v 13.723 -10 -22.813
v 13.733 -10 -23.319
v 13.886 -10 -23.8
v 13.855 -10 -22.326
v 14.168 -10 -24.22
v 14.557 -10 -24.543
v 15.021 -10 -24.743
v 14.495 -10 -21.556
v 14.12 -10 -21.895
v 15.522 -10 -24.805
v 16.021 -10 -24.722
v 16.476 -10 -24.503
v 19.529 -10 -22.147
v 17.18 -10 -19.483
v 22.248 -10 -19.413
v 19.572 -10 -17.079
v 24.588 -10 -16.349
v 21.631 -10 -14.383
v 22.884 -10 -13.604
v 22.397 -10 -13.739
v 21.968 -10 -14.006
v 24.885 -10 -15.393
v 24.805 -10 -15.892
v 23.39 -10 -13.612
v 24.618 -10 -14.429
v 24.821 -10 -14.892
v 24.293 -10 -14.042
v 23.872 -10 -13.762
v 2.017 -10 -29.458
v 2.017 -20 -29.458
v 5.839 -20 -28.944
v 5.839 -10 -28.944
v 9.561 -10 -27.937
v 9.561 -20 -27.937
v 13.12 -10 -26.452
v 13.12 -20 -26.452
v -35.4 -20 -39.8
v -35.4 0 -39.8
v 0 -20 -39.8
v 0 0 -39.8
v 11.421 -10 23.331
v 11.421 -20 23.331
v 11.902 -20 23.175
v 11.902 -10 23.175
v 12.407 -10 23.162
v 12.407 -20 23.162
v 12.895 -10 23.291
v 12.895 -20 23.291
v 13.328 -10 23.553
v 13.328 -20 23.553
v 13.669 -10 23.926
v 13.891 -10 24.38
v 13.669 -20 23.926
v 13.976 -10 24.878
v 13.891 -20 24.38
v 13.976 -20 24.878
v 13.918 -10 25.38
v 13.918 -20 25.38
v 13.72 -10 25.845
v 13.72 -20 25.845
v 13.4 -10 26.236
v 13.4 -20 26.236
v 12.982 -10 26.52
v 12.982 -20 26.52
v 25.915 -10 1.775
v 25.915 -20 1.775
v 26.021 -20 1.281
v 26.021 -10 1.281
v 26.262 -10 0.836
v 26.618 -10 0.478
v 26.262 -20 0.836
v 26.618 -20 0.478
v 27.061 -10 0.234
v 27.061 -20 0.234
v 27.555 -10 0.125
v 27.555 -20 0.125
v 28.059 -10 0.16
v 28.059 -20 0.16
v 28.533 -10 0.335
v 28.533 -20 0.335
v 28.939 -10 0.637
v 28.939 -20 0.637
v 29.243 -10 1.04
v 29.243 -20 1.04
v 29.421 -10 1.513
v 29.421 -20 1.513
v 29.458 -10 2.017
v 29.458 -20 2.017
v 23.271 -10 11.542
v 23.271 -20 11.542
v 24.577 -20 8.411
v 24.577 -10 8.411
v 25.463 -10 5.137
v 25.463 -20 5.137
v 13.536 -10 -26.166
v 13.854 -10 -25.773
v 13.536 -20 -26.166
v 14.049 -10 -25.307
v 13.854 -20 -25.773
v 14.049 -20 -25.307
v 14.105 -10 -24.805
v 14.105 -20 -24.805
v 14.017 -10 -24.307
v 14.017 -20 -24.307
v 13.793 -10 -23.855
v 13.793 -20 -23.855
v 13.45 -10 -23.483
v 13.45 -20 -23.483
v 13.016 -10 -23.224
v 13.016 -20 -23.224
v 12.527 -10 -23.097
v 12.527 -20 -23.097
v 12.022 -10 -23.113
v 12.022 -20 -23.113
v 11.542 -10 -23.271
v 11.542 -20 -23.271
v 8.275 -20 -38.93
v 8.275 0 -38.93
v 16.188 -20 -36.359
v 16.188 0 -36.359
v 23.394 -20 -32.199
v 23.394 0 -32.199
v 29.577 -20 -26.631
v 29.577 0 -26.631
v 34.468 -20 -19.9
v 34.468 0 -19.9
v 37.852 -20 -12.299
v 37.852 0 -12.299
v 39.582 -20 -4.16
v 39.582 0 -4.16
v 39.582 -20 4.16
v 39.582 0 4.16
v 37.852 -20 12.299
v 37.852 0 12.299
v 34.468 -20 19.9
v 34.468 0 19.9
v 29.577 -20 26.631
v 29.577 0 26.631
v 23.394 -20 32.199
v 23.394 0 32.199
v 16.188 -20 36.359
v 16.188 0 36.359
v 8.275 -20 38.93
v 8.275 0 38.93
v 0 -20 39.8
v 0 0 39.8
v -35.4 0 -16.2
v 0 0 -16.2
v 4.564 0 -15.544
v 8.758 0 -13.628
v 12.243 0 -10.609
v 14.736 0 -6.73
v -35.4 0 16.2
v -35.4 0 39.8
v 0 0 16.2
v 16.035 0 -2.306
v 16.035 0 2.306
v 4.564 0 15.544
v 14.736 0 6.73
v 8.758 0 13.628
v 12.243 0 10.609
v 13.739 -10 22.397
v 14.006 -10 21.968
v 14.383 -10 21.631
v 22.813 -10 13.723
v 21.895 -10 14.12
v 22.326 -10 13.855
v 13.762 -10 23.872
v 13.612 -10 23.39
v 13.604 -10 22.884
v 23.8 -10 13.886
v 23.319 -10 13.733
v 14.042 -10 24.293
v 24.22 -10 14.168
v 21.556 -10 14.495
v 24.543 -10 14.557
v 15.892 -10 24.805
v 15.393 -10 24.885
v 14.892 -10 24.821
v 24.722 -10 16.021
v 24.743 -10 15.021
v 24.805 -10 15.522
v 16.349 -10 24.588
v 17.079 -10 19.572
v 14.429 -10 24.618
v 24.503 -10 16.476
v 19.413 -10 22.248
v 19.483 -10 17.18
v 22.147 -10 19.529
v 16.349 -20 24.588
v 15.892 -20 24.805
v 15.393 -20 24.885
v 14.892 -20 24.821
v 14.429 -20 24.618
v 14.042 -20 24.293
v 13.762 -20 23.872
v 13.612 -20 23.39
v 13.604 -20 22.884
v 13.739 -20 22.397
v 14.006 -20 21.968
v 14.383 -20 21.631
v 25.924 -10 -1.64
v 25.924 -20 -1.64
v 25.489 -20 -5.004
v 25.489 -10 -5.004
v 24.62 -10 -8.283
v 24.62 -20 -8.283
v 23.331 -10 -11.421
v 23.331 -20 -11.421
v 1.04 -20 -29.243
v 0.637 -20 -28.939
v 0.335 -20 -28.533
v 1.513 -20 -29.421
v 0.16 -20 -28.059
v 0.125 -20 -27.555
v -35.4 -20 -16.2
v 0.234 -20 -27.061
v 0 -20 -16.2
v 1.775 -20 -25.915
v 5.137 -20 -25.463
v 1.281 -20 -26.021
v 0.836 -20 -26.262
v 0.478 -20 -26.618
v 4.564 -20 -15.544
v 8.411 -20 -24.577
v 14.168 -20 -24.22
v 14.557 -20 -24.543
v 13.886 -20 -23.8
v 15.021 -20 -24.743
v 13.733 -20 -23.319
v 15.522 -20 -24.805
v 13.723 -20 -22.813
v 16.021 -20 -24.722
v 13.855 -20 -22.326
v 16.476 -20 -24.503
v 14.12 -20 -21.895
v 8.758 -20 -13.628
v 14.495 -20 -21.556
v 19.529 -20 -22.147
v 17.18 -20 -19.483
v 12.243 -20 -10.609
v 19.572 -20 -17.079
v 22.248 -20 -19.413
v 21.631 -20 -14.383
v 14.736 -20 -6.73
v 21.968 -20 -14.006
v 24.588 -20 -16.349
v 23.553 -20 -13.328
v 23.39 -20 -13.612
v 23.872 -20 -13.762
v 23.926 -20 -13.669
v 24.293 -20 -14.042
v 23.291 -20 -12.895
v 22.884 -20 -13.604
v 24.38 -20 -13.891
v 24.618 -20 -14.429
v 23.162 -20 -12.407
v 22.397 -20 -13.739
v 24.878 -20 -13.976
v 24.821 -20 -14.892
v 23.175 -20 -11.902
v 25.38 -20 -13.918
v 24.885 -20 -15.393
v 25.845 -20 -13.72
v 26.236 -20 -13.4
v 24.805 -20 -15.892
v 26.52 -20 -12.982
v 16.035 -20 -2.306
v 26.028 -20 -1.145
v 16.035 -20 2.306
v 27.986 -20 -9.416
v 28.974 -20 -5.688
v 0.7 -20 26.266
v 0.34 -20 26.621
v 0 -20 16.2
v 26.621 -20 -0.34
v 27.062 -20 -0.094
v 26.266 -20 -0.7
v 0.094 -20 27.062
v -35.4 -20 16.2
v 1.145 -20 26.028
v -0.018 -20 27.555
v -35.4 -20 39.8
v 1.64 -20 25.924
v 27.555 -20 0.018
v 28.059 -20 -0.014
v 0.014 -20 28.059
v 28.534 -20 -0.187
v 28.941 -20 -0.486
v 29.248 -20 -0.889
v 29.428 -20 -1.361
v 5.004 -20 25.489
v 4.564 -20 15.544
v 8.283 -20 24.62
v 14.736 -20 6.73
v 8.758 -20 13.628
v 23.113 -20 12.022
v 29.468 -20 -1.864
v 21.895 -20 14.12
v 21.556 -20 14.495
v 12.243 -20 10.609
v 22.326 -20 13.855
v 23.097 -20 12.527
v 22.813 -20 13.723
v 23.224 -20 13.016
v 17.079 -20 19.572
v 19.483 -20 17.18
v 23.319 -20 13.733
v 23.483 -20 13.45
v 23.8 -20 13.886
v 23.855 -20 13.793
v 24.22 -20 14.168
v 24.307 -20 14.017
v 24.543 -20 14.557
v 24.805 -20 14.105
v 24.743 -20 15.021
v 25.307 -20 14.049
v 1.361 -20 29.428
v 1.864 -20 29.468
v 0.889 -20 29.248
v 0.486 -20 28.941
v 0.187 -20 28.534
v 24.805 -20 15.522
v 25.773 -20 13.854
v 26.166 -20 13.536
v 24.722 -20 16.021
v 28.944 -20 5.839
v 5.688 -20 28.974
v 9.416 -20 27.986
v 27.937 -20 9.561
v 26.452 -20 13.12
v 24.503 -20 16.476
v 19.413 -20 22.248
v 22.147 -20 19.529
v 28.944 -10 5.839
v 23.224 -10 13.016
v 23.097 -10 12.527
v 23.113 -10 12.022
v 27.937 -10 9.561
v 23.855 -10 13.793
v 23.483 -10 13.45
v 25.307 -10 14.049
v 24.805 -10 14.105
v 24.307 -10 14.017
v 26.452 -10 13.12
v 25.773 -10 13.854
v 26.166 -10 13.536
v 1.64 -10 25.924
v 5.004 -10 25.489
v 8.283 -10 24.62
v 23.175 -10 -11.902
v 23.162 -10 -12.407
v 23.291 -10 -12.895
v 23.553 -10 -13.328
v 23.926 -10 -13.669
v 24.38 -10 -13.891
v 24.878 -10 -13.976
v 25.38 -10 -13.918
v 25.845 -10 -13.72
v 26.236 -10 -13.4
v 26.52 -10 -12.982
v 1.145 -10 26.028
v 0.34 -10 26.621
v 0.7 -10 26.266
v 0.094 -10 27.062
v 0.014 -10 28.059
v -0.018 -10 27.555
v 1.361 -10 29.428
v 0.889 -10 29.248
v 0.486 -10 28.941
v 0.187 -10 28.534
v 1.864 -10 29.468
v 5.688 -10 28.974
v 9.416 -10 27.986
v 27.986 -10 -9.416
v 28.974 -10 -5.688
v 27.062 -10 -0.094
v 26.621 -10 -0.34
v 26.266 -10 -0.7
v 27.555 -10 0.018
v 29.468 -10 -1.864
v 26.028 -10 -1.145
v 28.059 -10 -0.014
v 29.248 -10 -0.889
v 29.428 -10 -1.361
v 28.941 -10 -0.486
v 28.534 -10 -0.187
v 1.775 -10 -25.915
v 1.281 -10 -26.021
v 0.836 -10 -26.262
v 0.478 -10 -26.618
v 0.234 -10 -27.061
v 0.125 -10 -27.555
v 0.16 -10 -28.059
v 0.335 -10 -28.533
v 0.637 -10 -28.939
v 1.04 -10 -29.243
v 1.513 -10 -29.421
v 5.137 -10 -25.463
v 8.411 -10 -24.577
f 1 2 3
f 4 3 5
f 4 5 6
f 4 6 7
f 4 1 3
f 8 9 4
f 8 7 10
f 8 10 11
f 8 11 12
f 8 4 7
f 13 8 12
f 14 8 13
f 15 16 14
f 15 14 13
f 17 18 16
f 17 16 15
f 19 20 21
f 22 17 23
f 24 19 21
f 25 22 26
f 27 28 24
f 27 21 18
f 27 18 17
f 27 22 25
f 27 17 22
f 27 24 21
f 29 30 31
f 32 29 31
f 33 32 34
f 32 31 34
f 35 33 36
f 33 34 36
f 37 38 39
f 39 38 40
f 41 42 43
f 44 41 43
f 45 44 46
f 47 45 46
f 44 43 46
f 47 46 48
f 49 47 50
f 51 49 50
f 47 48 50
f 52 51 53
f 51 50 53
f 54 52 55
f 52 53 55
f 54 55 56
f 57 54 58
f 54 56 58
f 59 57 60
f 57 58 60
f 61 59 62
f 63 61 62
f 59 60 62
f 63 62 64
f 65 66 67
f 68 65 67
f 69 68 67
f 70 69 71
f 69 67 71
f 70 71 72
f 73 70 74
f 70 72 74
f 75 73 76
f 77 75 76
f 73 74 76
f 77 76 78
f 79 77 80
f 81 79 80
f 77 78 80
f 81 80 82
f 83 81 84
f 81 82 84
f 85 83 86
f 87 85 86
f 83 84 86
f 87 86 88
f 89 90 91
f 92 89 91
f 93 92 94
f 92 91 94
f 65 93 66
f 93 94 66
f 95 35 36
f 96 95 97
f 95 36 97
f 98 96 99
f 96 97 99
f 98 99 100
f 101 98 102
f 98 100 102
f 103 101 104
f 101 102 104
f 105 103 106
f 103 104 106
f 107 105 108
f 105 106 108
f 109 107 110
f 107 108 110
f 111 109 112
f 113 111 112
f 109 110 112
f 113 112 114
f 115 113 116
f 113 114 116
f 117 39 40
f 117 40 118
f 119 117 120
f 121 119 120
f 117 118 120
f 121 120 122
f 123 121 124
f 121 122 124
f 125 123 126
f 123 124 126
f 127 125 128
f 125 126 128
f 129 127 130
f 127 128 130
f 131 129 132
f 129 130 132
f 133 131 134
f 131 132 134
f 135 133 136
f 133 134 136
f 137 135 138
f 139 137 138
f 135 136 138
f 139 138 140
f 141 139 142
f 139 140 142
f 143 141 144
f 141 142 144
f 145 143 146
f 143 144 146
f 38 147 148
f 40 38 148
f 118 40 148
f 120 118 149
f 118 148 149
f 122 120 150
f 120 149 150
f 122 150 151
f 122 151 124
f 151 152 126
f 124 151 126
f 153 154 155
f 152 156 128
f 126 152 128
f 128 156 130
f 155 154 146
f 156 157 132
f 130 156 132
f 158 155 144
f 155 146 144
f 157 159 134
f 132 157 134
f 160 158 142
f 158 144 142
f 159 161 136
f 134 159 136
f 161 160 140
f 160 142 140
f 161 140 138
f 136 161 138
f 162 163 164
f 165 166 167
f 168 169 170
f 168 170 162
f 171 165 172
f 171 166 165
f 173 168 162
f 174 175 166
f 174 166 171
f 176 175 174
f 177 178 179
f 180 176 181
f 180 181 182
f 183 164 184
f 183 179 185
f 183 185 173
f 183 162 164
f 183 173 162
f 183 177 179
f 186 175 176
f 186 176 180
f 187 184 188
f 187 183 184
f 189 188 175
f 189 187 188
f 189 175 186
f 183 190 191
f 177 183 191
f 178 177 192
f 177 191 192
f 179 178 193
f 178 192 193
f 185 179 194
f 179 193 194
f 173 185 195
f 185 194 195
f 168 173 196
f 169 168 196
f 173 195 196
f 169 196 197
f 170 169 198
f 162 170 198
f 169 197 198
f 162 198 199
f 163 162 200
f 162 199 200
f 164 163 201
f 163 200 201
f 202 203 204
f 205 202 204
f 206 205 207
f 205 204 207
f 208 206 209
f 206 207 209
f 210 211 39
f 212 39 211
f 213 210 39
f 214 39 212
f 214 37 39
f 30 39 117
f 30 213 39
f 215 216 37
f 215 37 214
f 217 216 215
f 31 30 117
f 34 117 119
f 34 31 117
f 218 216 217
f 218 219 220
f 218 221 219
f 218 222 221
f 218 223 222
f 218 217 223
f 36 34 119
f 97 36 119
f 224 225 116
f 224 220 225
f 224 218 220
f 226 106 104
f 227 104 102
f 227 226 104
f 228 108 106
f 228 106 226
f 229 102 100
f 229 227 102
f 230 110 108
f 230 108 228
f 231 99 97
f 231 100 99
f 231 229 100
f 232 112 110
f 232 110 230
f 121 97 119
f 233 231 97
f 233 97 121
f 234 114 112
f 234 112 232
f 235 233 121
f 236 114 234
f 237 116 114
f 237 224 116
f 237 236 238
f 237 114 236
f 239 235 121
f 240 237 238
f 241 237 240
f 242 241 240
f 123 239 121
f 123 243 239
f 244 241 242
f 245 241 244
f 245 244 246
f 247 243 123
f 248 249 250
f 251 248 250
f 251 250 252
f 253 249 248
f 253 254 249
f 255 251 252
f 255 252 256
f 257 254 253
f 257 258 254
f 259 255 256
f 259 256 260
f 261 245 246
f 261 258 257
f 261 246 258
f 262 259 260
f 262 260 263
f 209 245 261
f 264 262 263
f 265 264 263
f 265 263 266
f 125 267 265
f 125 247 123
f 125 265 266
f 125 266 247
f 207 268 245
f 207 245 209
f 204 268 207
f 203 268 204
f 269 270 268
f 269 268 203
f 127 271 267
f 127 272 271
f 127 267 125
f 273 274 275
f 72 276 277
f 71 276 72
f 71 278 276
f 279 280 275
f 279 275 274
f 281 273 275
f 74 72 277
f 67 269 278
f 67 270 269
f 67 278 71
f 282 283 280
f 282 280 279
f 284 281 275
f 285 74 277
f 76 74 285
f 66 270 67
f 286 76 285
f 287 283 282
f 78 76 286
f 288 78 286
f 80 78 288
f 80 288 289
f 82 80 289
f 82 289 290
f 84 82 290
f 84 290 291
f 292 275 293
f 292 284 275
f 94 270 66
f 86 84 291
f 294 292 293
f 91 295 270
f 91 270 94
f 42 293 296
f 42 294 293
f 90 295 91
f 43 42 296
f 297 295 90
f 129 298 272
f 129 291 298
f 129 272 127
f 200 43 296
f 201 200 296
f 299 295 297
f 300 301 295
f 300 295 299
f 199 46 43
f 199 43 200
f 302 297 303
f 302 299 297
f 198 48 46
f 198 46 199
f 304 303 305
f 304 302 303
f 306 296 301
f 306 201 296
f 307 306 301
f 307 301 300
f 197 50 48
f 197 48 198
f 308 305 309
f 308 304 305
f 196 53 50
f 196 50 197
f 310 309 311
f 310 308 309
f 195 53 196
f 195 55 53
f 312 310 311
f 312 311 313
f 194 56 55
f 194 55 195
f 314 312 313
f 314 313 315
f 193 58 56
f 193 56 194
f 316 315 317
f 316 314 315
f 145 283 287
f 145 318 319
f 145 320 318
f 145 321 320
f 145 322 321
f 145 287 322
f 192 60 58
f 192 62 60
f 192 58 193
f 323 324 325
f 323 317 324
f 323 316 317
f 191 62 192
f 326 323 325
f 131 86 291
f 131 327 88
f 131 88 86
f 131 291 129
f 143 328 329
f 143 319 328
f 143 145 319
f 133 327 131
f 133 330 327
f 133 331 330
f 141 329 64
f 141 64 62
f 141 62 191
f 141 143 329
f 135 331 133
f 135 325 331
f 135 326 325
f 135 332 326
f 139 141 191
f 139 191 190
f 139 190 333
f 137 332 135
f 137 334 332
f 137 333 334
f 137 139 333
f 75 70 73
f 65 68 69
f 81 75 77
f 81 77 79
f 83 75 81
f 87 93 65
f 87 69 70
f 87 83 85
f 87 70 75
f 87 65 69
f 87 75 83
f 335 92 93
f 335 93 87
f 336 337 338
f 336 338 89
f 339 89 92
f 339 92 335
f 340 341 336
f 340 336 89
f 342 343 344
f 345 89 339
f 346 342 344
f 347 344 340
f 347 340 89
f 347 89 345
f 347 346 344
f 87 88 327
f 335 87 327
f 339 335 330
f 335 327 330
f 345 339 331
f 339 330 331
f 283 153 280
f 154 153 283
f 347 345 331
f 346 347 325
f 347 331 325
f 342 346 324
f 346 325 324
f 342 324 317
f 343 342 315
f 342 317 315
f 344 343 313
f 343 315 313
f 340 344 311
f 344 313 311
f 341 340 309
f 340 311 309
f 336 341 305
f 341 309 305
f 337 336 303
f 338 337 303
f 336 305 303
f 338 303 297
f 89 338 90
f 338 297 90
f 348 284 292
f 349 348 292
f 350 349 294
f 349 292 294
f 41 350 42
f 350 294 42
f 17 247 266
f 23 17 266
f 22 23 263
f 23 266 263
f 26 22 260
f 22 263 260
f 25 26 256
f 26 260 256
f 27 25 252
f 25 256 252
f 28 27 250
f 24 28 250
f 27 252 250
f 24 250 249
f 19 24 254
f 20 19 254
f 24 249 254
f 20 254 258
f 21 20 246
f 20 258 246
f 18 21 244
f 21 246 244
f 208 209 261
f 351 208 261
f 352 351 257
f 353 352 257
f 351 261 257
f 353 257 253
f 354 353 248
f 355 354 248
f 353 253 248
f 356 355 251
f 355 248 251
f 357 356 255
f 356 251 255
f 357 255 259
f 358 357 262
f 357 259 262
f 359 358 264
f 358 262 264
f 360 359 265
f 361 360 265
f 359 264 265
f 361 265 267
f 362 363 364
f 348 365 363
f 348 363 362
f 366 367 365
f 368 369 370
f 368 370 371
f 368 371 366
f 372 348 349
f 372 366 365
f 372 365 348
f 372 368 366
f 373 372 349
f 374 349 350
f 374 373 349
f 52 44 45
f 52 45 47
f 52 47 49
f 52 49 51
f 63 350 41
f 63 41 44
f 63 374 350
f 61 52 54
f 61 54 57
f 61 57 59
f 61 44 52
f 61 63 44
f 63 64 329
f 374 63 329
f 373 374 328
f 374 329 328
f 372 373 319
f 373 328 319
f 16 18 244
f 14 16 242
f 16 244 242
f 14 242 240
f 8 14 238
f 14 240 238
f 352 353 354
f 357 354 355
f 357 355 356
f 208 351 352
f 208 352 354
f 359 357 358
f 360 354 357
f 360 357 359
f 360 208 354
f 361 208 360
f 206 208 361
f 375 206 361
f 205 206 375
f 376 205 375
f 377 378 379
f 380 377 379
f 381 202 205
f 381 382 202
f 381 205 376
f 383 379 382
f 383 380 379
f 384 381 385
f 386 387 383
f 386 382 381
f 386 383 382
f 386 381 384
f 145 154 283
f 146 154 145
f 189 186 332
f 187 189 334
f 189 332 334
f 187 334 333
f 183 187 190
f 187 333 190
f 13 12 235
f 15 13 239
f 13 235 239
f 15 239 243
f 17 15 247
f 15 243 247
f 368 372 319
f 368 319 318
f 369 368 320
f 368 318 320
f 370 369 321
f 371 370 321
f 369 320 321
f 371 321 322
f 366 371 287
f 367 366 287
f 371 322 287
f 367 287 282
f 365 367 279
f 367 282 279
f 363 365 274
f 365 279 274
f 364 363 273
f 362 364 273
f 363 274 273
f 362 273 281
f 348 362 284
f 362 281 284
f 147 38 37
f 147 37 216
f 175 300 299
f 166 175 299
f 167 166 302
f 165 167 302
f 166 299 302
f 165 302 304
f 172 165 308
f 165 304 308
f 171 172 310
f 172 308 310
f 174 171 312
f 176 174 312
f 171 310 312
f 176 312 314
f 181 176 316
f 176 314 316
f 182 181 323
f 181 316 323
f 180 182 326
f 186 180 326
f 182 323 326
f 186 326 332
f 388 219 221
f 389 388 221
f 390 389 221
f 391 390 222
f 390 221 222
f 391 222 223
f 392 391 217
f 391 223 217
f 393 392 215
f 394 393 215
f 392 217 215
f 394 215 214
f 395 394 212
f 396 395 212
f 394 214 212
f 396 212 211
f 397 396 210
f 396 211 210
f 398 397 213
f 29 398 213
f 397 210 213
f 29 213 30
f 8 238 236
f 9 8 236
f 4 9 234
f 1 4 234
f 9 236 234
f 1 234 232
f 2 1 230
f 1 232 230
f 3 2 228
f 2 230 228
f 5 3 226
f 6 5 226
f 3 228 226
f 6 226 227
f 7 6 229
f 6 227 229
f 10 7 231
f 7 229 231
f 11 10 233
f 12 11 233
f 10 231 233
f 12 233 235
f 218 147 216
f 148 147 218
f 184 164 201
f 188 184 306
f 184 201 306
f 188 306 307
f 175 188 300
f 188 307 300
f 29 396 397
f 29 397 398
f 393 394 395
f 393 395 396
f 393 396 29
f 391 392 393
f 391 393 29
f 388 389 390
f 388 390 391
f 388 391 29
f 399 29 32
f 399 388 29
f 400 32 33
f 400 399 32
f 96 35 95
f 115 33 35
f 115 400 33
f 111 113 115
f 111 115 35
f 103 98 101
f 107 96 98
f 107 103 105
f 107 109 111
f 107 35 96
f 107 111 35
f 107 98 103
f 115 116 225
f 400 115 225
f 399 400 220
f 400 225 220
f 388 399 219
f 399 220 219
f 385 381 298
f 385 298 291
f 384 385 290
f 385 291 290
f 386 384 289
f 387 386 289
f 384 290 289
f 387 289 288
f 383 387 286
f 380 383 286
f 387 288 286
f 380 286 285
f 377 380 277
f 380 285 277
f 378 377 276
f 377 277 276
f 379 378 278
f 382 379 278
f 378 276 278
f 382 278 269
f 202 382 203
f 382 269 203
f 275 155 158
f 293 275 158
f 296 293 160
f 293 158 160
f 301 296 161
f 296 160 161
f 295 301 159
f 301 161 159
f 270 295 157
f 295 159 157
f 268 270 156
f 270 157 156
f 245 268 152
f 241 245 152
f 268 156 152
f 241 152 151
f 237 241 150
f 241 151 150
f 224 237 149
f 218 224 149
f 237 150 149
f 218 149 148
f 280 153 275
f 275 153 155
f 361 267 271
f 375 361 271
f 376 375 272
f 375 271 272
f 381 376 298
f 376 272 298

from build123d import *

# Parameters (mm, degrees)
F0_W     = 35.4
F0_H     = 23.6
F1_DEPTH = 20
F3_DEPTH = 10


with BuildPart() as f1:
    # F0 (on Front) → F1 (new body)
    with BuildSketch(Plane.XZ):
        with Locations((-17.7, 28)):
            Rectangle(F0_W, F0_H)
        with BuildLine():
            ThreePointArc((0, -39.8), (39.8, 0), (0, 39.8))
            Line((0, 39.8), (0, 16.2))
            ThreePointArc((0, 16.2), (16.2, 0), (0, -16.2))
            Line((0, -16.2), (0, -39.8))
        make_face()
        with Locations((-17.7, -28)):
            Rectangle(F0_W, F0_H)
    extrude(amount=F1_DEPTH)

    # F2 (on face) → F3 (cut)
    with BuildSketch(Plane.XZ.offset(20)):
        with BuildLine():
            ThreePointArc((12.98208, 26.520214), (7.568156, 28.540833), (1.864359, 29.468293))
            ThreePointArc((1.864359, 29.468293), (-0.019794, 27.808362), (1.640137, 25.924209))
            ThreePointArc((1.640137, 25.924209), (6.657951, 25.108293), (11.420755, 23.330688))
            ThreePointArc((11.420755, 23.330688), (13.79618, 24.144789), (12.98208, 26.520214))
        make_face()
        with BuildLine():
            ThreePointArc((14.382505, 21.630955), (18.320101, 18.415444), (21.556008, 14.494592))
            ThreePointArc((21.556008, 14.494592), (24.020237, 14.01191), (24.502918, 16.476139))
            ThreePointArc((24.502918, 16.476139), (20.824632, 20.933009), (16.348729, 24.588111))
            ThreePointArc((16.348729, 24.588111), (13.887039, 24.092645), (14.382505, 21.630955))
        make_face()
        with BuildLine():
            ThreePointArc((23.271092, 11.541705), (25.073395, 6.788192), (25.915346, 1.77468))
            ThreePointArc((25.915346, 1.77468), (27.80809, 0.124552), (29.458219, 2.017296))
            ThreePointArc((29.458219, 2.017296), (28.501164, 7.716202), (26.45247, 13.119565))
            ThreePointArc((26.45247, 13.119565), (24.072851, 13.921324), (23.271092, 11.541705))
        make_face()
        with BuildLine():
            ThreePointArc((25.924209, -1.640137), (25.108293, -6.657951), (23.330688, -11.420755))
            ThreePointArc((23.330688, -11.420755), (24.144789, -13.79618), (26.520214, -12.98208))
            ThreePointArc((26.520214, -12.98208), (28.540833, -7.568156), (29.468293, -1.864359))
            ThreePointArc((29.468293, -1.864359), (27.808362, 0.019794), (25.924209, -1.640137))
        make_face()
        with BuildLine():
            ThreePointArc((21.630955, -14.382505), (18.415444, -18.320101), (14.494592, -21.556008))
            ThreePointArc((14.494592, -21.556008), (14.01191, -24.020237), (16.476139, -24.502918))
            ThreePointArc((16.476139, -24.502918), (20.933009, -20.824632), (24.588111, -16.348729))
            ThreePointArc((24.588111, -16.348729), (24.092645, -13.887039), (21.630955, -14.382505))
        make_face()
        with BuildLine():
            ThreePointArc((11.541705, -23.271092), (6.788192, -25.073395), (1.77468, -25.915346))
            ThreePointArc((1.77468, -25.915346), (0.124552, -27.80809), (2.017296, -29.458219))
            ThreePointArc((2.017296, -29.458219), (7.716202, -28.501164), (13.119565, -26.45247))
            ThreePointArc((13.119565, -26.45247), (13.921324, -24.072851), (11.541705, -23.271092))
        make_face()
    extrude(amount=-F3_DEPTH, mode=Mode.SUBTRACT)


solid = f1.part
